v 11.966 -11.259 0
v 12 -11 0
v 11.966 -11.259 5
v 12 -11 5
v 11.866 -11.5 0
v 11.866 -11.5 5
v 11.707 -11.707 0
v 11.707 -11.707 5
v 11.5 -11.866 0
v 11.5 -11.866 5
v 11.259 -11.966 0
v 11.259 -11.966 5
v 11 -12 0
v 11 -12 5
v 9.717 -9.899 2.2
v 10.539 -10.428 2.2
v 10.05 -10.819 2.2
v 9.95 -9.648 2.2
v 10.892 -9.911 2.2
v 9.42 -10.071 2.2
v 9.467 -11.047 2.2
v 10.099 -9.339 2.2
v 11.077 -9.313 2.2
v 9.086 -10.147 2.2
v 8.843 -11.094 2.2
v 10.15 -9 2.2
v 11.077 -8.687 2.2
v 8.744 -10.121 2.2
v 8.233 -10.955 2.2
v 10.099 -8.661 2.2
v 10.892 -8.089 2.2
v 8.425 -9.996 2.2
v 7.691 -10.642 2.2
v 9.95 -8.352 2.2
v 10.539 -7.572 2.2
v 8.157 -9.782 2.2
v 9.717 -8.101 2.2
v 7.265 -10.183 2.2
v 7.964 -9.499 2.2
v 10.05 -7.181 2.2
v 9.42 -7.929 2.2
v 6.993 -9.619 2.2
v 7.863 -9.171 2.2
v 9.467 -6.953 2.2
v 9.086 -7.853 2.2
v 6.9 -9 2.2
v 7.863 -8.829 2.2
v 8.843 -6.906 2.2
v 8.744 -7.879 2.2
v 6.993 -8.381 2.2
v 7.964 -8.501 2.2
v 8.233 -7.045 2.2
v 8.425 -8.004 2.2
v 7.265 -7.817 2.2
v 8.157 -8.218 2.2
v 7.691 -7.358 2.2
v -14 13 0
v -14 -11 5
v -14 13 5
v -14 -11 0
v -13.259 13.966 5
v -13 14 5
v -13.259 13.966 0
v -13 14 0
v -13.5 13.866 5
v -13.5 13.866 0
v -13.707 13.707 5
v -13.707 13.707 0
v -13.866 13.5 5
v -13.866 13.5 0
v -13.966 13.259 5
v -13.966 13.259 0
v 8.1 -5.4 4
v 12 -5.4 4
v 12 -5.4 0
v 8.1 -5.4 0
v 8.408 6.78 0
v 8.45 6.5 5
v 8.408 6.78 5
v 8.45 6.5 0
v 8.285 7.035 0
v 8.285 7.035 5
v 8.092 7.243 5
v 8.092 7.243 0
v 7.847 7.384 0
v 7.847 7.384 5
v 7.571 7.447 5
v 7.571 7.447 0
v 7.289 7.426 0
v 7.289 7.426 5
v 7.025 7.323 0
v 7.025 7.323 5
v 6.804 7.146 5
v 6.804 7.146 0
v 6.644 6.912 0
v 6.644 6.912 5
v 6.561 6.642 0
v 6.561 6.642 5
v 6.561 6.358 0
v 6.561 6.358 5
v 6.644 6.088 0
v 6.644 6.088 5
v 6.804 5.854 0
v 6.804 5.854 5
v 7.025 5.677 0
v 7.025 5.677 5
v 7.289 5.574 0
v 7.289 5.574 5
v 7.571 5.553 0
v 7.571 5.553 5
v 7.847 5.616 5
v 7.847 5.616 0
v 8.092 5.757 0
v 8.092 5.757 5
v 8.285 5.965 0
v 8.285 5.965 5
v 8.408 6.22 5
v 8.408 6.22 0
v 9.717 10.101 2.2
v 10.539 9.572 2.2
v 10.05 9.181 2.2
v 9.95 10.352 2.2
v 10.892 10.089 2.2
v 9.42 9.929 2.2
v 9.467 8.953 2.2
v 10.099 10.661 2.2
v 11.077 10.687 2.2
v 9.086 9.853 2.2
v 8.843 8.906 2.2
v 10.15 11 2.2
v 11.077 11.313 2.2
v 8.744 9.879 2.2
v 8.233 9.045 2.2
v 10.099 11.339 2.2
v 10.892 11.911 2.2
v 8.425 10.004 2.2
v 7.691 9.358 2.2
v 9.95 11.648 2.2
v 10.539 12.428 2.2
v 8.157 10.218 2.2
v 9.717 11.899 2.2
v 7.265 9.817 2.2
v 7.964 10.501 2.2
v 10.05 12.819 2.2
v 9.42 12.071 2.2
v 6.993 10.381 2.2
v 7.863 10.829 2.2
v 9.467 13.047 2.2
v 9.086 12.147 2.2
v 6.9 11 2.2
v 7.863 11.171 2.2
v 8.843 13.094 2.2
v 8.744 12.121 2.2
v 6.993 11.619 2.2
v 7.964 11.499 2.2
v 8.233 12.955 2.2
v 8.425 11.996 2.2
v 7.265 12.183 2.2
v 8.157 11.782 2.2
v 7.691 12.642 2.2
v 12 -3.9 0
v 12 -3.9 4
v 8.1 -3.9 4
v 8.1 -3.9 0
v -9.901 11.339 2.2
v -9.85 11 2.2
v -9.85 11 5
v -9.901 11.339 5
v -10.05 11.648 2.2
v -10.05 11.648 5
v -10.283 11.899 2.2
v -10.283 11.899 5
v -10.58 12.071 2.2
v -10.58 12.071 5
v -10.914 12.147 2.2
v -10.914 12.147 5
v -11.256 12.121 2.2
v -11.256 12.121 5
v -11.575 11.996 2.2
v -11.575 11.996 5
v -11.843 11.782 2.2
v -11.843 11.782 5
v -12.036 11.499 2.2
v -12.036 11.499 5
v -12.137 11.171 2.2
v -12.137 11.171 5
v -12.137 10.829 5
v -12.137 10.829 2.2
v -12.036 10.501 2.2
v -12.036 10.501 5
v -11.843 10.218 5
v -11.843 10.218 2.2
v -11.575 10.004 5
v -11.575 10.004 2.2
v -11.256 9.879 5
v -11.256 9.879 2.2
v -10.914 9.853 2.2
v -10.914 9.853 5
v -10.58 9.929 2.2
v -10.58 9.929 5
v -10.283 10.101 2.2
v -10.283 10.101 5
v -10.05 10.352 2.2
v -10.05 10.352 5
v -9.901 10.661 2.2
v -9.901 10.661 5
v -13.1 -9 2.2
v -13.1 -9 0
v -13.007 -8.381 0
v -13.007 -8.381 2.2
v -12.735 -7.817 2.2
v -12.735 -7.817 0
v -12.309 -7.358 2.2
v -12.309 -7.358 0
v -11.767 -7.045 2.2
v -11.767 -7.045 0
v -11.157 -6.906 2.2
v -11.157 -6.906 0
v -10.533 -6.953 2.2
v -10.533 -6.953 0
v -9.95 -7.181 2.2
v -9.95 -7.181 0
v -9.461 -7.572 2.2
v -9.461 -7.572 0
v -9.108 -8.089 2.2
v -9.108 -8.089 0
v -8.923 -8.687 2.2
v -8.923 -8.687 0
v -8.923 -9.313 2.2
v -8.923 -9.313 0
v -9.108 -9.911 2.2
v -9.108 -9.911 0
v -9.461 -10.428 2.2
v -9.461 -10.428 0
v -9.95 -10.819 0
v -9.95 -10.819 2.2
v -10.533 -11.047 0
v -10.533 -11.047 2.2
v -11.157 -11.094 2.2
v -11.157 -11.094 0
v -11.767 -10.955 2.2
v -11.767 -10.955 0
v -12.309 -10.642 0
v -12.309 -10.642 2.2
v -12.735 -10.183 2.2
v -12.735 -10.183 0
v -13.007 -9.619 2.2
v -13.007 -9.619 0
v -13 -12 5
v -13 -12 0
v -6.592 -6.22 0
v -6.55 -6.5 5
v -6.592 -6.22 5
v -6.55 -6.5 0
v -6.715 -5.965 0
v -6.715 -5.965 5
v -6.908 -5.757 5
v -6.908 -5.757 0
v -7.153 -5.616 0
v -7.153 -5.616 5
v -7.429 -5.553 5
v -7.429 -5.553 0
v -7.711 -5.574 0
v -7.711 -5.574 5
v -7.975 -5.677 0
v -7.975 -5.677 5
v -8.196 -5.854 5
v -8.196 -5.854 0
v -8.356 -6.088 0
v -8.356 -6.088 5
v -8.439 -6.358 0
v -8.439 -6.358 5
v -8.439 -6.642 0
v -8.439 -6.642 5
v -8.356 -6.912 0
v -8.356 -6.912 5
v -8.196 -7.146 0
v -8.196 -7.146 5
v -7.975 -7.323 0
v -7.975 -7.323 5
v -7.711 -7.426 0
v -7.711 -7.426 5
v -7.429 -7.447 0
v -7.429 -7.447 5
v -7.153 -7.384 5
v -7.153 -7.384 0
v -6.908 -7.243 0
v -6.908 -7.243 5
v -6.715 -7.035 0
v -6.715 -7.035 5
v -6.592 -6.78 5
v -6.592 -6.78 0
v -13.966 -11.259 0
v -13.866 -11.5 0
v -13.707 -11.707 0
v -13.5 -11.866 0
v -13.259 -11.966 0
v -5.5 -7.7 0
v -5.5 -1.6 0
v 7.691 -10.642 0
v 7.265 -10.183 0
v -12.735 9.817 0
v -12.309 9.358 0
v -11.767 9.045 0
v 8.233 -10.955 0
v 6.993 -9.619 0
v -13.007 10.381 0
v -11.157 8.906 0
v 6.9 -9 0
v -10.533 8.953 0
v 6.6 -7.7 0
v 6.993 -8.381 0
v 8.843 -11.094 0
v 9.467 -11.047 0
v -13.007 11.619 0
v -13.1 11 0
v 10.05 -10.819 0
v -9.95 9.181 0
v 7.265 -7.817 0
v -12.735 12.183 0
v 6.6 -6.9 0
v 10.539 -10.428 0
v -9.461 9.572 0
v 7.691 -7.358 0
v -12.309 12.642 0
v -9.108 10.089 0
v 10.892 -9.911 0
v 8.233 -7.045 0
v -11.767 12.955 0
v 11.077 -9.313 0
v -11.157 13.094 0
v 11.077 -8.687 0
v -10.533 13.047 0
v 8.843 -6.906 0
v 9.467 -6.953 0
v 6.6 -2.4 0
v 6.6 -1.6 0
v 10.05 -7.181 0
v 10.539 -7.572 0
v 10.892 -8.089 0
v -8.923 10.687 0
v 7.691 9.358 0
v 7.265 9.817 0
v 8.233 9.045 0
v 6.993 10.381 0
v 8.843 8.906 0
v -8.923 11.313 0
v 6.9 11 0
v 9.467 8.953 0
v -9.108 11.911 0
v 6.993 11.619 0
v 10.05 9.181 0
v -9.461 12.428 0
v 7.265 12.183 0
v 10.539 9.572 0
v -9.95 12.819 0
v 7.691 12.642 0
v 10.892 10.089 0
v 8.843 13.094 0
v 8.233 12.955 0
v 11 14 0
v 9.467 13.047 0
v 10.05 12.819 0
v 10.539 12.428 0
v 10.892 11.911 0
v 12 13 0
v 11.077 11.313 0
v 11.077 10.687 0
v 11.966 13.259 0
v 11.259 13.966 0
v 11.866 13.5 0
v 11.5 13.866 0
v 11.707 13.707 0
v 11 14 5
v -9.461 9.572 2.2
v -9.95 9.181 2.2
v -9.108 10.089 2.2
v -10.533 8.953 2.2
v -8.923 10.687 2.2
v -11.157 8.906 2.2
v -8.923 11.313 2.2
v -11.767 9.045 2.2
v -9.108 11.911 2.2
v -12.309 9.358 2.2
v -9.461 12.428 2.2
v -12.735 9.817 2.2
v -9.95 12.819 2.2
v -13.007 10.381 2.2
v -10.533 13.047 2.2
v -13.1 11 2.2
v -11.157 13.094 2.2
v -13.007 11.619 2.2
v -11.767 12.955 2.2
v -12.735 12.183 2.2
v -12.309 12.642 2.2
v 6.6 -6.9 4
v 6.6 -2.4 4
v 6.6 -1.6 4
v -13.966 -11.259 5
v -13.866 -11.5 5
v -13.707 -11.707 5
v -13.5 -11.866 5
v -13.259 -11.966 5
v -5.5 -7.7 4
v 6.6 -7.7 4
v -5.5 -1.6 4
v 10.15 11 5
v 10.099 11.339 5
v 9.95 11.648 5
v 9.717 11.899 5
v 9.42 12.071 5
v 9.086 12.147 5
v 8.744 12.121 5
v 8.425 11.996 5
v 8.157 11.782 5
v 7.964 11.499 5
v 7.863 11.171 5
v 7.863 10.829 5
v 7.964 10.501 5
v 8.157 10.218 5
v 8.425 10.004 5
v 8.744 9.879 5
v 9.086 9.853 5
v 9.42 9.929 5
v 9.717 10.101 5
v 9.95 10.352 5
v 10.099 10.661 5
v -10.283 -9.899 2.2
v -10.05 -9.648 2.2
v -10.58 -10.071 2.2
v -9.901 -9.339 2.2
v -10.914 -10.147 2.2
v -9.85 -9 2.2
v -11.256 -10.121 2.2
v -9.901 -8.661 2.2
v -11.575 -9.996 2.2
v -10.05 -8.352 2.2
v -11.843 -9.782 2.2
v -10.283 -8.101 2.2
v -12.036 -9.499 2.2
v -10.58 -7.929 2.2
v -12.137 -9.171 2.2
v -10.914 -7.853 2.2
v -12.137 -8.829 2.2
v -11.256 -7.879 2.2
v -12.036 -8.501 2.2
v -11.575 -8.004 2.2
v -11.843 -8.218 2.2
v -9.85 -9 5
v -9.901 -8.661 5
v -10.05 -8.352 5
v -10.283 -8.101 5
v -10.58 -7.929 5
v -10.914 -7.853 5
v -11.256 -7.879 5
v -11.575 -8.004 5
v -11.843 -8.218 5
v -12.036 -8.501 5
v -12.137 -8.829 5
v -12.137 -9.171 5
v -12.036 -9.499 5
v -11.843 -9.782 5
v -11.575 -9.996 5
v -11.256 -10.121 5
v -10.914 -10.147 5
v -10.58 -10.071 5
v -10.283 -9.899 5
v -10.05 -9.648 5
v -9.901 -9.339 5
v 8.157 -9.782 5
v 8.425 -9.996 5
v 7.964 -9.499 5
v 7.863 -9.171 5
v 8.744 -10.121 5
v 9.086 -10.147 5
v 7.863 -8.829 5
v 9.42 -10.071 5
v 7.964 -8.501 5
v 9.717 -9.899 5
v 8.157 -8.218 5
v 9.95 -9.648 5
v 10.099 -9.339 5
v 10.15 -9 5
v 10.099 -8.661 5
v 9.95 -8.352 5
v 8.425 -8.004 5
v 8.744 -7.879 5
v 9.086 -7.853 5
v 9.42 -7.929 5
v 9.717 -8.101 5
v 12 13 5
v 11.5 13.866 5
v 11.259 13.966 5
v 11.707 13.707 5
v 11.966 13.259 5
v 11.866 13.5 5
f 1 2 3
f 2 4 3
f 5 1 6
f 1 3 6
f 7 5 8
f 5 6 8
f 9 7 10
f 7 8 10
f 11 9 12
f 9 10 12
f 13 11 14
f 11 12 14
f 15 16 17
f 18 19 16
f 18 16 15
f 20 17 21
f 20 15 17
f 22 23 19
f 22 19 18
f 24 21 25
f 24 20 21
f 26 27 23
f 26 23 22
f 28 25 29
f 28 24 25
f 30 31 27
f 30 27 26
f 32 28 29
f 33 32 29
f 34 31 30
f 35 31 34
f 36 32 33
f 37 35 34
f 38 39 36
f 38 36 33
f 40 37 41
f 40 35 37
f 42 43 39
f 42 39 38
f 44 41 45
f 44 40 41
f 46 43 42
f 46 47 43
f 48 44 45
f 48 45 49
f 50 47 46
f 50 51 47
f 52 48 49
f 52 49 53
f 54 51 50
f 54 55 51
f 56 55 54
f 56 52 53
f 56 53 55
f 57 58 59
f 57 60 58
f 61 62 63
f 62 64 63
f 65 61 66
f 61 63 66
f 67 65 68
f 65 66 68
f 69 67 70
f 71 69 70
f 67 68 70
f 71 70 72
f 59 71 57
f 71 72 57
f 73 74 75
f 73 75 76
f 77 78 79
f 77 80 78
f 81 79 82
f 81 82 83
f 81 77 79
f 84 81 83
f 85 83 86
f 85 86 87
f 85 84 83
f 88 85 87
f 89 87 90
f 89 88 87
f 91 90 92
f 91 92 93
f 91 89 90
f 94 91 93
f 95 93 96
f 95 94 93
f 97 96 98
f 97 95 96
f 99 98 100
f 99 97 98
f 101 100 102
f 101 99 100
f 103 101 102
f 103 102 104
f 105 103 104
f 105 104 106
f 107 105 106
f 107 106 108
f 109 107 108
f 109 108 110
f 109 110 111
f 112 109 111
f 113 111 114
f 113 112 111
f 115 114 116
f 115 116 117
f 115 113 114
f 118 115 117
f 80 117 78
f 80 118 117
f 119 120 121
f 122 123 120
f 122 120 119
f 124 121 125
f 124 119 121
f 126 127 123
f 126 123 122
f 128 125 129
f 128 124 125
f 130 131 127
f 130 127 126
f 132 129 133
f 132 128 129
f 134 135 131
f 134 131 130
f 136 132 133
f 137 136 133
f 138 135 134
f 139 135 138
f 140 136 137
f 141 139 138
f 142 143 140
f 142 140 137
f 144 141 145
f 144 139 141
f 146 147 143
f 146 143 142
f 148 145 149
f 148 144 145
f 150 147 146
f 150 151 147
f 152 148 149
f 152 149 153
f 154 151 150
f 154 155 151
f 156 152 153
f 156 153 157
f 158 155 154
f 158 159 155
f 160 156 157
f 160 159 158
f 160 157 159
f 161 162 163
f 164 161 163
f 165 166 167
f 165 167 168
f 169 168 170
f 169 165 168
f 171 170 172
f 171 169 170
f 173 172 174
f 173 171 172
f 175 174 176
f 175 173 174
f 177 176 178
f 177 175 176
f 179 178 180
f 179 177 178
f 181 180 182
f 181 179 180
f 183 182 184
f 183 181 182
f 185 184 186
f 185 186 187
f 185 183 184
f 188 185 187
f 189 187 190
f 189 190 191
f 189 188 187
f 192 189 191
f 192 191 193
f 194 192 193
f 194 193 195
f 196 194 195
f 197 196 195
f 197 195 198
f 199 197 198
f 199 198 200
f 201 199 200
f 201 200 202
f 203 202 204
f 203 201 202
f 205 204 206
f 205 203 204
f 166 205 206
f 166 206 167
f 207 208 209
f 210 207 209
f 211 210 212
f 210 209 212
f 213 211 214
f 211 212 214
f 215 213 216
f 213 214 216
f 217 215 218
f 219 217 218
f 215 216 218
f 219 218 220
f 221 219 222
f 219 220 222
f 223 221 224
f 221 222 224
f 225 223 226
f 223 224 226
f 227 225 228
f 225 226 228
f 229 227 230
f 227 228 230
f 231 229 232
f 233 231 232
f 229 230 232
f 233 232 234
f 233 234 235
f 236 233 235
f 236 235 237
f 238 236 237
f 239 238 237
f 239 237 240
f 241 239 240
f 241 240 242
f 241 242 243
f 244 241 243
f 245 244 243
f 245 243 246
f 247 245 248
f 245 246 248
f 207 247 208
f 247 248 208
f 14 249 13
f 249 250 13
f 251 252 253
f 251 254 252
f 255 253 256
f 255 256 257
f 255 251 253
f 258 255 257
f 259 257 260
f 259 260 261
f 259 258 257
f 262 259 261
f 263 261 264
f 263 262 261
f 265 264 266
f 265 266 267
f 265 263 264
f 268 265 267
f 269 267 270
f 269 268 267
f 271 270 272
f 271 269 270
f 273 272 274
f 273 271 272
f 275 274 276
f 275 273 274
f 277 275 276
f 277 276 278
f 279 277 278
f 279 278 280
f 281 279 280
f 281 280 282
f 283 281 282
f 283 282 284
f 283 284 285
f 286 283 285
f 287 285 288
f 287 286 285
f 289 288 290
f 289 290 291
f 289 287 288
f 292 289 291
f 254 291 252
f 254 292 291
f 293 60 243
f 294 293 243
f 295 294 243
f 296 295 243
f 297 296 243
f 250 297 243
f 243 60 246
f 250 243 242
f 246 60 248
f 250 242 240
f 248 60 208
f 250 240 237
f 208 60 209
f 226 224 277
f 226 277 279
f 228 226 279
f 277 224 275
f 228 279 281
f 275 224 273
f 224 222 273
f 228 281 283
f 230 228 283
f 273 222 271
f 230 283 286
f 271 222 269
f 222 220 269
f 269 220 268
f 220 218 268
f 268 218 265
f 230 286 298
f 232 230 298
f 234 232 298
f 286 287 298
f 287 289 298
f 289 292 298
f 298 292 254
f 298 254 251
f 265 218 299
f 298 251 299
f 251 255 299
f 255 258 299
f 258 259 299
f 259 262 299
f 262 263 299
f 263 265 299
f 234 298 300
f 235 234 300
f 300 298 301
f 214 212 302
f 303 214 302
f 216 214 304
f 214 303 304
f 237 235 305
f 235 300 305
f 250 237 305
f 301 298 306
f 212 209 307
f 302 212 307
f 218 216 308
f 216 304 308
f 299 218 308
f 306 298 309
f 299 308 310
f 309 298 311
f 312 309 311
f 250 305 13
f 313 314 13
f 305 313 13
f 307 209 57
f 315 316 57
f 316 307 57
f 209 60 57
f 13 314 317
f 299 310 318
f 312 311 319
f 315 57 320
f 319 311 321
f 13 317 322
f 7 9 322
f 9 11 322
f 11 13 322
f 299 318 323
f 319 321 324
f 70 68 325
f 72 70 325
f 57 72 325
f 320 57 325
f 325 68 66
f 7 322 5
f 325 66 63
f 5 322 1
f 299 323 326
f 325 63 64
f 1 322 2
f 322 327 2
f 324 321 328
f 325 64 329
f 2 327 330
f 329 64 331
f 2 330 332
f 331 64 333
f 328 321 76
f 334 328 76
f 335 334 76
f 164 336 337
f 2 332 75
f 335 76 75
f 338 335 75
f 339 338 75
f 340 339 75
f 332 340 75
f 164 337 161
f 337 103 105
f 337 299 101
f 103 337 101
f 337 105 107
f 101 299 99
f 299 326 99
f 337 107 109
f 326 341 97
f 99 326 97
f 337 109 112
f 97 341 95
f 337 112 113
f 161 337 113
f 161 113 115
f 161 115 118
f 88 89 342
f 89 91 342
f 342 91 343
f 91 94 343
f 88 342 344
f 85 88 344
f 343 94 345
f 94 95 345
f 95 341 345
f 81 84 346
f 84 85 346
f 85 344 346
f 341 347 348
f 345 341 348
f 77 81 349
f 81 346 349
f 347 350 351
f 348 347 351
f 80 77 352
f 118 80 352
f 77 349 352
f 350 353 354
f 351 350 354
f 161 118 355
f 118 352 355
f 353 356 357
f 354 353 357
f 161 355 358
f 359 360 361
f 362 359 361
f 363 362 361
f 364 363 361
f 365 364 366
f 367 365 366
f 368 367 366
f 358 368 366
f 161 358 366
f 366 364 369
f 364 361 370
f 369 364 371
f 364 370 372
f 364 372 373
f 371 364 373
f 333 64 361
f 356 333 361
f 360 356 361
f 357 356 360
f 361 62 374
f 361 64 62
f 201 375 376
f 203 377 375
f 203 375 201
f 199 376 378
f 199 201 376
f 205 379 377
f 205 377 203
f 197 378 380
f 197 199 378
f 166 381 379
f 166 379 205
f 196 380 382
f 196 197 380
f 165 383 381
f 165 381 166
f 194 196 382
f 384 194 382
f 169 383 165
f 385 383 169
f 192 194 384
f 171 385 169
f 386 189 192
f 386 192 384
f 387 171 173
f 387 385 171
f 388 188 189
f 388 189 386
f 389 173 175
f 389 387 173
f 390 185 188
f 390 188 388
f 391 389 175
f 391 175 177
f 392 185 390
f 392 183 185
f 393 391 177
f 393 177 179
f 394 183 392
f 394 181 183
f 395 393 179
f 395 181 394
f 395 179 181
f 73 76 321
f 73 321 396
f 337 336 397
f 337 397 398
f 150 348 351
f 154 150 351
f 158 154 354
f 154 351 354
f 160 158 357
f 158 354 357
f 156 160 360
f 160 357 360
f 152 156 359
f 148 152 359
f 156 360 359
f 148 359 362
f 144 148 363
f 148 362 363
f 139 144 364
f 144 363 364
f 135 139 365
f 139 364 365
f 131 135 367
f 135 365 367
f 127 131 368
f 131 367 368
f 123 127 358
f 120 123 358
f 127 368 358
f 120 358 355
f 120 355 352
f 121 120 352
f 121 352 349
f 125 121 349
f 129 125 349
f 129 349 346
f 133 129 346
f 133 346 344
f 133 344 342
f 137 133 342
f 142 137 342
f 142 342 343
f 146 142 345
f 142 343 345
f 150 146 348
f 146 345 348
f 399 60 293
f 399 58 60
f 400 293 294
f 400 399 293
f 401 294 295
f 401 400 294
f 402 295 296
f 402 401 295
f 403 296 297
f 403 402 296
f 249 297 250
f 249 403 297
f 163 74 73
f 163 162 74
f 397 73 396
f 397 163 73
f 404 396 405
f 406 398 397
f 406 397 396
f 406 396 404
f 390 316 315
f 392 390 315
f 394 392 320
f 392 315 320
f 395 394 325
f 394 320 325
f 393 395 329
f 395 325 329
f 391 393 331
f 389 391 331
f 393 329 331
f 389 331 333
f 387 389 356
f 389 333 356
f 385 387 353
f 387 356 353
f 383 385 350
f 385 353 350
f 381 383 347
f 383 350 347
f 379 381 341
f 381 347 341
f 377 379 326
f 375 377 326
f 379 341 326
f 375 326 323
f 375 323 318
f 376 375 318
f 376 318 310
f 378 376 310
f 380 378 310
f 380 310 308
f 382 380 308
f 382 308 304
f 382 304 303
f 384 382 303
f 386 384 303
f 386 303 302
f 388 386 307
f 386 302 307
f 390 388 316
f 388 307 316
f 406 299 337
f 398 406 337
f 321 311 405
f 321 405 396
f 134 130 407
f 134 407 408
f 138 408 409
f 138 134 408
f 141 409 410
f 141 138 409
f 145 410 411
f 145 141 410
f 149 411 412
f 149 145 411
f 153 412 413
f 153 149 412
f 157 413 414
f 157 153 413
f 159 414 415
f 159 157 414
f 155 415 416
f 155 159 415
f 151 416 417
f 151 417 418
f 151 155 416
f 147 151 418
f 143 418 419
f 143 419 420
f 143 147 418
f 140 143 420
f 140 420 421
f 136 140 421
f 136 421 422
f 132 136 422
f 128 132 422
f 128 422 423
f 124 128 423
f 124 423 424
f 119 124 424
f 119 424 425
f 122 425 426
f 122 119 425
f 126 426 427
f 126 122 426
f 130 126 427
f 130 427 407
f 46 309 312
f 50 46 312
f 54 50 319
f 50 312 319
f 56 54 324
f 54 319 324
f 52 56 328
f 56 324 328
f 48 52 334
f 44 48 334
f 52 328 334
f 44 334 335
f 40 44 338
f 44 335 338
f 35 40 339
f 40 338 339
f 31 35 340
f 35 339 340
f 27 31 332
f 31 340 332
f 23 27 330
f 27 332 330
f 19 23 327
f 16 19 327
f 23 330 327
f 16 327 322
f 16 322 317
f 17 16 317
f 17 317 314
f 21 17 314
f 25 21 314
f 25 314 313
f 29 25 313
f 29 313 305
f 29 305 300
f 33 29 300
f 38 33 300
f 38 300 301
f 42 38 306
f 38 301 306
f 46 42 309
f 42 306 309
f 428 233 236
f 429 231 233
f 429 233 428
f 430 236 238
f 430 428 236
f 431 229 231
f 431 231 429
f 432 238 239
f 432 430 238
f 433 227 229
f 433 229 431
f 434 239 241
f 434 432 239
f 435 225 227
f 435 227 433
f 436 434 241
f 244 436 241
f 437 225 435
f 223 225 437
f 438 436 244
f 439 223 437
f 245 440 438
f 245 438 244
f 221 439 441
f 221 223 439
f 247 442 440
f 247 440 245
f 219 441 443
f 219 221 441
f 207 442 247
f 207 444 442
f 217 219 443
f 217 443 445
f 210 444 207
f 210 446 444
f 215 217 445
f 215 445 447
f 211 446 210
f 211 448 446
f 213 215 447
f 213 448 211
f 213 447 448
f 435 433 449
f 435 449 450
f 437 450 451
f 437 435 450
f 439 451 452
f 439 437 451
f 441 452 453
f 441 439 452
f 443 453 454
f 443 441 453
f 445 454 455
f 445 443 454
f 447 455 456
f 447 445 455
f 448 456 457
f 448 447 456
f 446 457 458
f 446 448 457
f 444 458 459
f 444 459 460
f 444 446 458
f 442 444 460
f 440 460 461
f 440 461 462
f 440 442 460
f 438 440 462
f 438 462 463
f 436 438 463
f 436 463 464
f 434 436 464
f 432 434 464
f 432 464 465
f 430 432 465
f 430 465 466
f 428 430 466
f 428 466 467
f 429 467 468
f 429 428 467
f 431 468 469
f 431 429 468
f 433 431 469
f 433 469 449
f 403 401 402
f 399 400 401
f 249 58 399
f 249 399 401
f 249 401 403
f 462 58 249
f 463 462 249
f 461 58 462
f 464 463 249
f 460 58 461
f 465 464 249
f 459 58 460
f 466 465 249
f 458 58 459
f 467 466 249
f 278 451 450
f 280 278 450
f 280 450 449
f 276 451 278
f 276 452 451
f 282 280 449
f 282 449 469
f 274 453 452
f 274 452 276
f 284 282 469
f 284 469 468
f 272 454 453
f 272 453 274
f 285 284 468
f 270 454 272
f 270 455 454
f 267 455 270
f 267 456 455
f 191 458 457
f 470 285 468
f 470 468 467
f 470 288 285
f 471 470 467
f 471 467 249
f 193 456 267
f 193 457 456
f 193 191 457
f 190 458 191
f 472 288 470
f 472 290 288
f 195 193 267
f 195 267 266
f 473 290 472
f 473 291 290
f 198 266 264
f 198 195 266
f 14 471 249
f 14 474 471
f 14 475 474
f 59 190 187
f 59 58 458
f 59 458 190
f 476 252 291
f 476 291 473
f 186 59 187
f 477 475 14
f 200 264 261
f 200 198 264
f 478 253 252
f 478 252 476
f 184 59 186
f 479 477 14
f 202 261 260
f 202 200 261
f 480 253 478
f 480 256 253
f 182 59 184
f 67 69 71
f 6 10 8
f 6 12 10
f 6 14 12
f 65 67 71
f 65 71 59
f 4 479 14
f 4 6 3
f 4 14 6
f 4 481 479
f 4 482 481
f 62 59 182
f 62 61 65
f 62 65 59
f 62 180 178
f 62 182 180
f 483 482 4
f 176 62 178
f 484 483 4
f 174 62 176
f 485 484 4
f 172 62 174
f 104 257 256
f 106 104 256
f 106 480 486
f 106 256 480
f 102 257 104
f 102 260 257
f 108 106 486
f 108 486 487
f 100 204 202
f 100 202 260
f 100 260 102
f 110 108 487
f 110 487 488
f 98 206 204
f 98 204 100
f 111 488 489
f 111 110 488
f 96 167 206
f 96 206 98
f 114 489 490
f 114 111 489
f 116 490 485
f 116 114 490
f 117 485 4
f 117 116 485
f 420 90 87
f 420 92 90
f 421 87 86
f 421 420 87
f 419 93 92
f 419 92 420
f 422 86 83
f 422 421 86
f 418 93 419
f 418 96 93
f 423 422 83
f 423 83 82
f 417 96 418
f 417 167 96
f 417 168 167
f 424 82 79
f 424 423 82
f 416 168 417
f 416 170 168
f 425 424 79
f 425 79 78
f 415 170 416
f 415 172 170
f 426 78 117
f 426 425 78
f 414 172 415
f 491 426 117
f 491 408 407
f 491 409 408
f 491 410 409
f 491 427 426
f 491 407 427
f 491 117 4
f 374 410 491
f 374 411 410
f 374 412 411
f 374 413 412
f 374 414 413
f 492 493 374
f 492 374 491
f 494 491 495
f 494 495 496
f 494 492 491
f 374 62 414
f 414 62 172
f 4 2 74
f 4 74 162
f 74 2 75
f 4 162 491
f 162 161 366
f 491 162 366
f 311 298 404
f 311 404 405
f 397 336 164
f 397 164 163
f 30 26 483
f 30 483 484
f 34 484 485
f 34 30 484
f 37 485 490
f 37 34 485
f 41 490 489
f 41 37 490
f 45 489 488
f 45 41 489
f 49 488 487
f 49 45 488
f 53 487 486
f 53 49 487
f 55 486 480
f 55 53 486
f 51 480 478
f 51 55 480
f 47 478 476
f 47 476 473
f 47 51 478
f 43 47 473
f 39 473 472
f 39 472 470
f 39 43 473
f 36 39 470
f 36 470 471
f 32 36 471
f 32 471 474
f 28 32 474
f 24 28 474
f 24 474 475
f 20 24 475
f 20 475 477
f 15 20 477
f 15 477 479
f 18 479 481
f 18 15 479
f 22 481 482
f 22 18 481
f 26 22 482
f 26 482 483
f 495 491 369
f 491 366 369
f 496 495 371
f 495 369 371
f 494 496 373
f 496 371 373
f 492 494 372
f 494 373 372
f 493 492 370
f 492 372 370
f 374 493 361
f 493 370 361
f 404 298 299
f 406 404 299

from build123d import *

# Parameters (mm, degrees)
SKETCH1_W           = 26
SKETCH1_H           = 26
SKETCH1_R           = 1.15
SKETCH1_R_2         = 0.95
SKETCH1_W_2         = 12.1
SKETCH1_H_2         = 6.1
BOSS_EXTRUDE1_DEPTH = 4
SKETCH7_W           = 26
SKETCH7_H           = 26
SKETCH7_R           = 0.95
SKETCH7_R_2         = 1.15
BOSS_EXTRUDE4_DEPTH = 1
SKETCH8_R           = 2.1
CUT_EXTRUDE5_DEPTH  = 2.2
SKETCH3_W           = 5.4
SKETCH3_H           = 1.5
CUT_EXTRUDE6_DEPTH  = 4
CHAMFER2_SIZE       = 1.5
FILLET1_R           = 1


with BuildPart() as part:
    # Sketch1 → Boss-Extrude1 (new body)
    with BuildSketch(Plane.XY):
        with Locations((-1, 1)):
            Rectangle(SKETCH1_W, SKETCH1_H)
        with Locations((-11, 11)):
            Circle(SKETCH1_R, mode=Mode.SUBTRACT)
        with Locations((9, 11)):
            Circle(SKETCH1_R, mode=Mode.SUBTRACT)
        with Locations((9, -9)):
            Circle(SKETCH1_R, mode=Mode.SUBTRACT)
        with Locations((-11, -9)):
            Circle(SKETCH1_R, mode=Mode.SUBTRACT)
        with Locations((7.5, 6.5)):
            Circle(SKETCH1_R_2, mode=Mode.SUBTRACT)
        with Locations((-7.5, -6.5)):
            Circle(SKETCH1_R_2, mode=Mode.SUBTRACT)
        with Locations((0.55, -4.65)):
            Rectangle(SKETCH1_W_2, SKETCH1_H_2, mode=Mode.SUBTRACT)
    extrude(amount=BOSS_EXTRUDE1_DEPTH)

    # Sketch7 → Boss-Extrude4 (add)
    with BuildSketch(Plane.XY.offset(4)):
        with Locations((-1, 1)):
            Rectangle(SKETCH7_W, SKETCH7_H)
        with Locations((7.5, 6.5)):
            Circle(SKETCH7_R, mode=Mode.SUBTRACT)
        with Locations((-7.5, -6.5)):
            Circle(SKETCH7_R, mode=Mode.SUBTRACT)
        with Locations((-11, -9)):
            Circle(SKETCH7_R_2, mode=Mode.SUBTRACT)
        with Locations((9, -9)):
            Circle(SKETCH7_R_2, mode=Mode.SUBTRACT)
        with Locations((9, 11)):
            Circle(SKETCH7_R_2, mode=Mode.SUBTRACT)
        with Locations((-11, 11)):
            Circle(SKETCH7_R_2, mode=Mode.SUBTRACT)
    extrude(amount=BOSS_EXTRUDE4_DEPTH)

    # Sketch8 → Cut-Extrude5 (cut)
    with BuildSketch(Plane(origin=(0, 0, 0), x_dir=(-1, 0, 0), z_dir=(0, 0, -1))):
        with Locations((-9, 11)):
            Circle(SKETCH8_R)
        with Locations((11, 11)):
            Circle(SKETCH8_R)
        with Locations((11, -9)):
            Circle(SKETCH8_R)
        with Locations((-9, -9)):
            Circle(SKETCH8_R)
    extrude(amount=-CUT_EXTRUDE5_DEPTH, mode=Mode.SUBTRACT)

    # Sketch3 → Cut-Extrude6 (cut)
    with BuildSketch(Plane(origin=(0, 0, 0), x_dir=(-1, 0, 0), z_dir=(0, 0, -1))):
        with Locations((-9.3, -4.65)):
            Rectangle(SKETCH3_W, SKETCH3_H)
    extrude(amount=-CUT_EXTRUDE6_DEPTH, mode=Mode.SUBTRACT)

    # Chamfer2
    chamfer2_edges = [part.edges().sort_by_distance(p)[0] for p in [
        (6.6, -5.4, 2),
        (6.6, -3.9, 2),
    ]]
    chamfer(chamfer2_edges, length=CHAMFER2_SIZE)

    # Fillet1
    fillet1_edges = [part.edges().sort_by_distance(p)[0] for p in [
        (12, -12, 2.5),
        (-14, -12, 2.5),
        (-14, 14, 2.5),
        (12, 14, 2.5),
    ]]
    fillet(fillet1_edges, radius=FILLET1_R)


solid = part.part
